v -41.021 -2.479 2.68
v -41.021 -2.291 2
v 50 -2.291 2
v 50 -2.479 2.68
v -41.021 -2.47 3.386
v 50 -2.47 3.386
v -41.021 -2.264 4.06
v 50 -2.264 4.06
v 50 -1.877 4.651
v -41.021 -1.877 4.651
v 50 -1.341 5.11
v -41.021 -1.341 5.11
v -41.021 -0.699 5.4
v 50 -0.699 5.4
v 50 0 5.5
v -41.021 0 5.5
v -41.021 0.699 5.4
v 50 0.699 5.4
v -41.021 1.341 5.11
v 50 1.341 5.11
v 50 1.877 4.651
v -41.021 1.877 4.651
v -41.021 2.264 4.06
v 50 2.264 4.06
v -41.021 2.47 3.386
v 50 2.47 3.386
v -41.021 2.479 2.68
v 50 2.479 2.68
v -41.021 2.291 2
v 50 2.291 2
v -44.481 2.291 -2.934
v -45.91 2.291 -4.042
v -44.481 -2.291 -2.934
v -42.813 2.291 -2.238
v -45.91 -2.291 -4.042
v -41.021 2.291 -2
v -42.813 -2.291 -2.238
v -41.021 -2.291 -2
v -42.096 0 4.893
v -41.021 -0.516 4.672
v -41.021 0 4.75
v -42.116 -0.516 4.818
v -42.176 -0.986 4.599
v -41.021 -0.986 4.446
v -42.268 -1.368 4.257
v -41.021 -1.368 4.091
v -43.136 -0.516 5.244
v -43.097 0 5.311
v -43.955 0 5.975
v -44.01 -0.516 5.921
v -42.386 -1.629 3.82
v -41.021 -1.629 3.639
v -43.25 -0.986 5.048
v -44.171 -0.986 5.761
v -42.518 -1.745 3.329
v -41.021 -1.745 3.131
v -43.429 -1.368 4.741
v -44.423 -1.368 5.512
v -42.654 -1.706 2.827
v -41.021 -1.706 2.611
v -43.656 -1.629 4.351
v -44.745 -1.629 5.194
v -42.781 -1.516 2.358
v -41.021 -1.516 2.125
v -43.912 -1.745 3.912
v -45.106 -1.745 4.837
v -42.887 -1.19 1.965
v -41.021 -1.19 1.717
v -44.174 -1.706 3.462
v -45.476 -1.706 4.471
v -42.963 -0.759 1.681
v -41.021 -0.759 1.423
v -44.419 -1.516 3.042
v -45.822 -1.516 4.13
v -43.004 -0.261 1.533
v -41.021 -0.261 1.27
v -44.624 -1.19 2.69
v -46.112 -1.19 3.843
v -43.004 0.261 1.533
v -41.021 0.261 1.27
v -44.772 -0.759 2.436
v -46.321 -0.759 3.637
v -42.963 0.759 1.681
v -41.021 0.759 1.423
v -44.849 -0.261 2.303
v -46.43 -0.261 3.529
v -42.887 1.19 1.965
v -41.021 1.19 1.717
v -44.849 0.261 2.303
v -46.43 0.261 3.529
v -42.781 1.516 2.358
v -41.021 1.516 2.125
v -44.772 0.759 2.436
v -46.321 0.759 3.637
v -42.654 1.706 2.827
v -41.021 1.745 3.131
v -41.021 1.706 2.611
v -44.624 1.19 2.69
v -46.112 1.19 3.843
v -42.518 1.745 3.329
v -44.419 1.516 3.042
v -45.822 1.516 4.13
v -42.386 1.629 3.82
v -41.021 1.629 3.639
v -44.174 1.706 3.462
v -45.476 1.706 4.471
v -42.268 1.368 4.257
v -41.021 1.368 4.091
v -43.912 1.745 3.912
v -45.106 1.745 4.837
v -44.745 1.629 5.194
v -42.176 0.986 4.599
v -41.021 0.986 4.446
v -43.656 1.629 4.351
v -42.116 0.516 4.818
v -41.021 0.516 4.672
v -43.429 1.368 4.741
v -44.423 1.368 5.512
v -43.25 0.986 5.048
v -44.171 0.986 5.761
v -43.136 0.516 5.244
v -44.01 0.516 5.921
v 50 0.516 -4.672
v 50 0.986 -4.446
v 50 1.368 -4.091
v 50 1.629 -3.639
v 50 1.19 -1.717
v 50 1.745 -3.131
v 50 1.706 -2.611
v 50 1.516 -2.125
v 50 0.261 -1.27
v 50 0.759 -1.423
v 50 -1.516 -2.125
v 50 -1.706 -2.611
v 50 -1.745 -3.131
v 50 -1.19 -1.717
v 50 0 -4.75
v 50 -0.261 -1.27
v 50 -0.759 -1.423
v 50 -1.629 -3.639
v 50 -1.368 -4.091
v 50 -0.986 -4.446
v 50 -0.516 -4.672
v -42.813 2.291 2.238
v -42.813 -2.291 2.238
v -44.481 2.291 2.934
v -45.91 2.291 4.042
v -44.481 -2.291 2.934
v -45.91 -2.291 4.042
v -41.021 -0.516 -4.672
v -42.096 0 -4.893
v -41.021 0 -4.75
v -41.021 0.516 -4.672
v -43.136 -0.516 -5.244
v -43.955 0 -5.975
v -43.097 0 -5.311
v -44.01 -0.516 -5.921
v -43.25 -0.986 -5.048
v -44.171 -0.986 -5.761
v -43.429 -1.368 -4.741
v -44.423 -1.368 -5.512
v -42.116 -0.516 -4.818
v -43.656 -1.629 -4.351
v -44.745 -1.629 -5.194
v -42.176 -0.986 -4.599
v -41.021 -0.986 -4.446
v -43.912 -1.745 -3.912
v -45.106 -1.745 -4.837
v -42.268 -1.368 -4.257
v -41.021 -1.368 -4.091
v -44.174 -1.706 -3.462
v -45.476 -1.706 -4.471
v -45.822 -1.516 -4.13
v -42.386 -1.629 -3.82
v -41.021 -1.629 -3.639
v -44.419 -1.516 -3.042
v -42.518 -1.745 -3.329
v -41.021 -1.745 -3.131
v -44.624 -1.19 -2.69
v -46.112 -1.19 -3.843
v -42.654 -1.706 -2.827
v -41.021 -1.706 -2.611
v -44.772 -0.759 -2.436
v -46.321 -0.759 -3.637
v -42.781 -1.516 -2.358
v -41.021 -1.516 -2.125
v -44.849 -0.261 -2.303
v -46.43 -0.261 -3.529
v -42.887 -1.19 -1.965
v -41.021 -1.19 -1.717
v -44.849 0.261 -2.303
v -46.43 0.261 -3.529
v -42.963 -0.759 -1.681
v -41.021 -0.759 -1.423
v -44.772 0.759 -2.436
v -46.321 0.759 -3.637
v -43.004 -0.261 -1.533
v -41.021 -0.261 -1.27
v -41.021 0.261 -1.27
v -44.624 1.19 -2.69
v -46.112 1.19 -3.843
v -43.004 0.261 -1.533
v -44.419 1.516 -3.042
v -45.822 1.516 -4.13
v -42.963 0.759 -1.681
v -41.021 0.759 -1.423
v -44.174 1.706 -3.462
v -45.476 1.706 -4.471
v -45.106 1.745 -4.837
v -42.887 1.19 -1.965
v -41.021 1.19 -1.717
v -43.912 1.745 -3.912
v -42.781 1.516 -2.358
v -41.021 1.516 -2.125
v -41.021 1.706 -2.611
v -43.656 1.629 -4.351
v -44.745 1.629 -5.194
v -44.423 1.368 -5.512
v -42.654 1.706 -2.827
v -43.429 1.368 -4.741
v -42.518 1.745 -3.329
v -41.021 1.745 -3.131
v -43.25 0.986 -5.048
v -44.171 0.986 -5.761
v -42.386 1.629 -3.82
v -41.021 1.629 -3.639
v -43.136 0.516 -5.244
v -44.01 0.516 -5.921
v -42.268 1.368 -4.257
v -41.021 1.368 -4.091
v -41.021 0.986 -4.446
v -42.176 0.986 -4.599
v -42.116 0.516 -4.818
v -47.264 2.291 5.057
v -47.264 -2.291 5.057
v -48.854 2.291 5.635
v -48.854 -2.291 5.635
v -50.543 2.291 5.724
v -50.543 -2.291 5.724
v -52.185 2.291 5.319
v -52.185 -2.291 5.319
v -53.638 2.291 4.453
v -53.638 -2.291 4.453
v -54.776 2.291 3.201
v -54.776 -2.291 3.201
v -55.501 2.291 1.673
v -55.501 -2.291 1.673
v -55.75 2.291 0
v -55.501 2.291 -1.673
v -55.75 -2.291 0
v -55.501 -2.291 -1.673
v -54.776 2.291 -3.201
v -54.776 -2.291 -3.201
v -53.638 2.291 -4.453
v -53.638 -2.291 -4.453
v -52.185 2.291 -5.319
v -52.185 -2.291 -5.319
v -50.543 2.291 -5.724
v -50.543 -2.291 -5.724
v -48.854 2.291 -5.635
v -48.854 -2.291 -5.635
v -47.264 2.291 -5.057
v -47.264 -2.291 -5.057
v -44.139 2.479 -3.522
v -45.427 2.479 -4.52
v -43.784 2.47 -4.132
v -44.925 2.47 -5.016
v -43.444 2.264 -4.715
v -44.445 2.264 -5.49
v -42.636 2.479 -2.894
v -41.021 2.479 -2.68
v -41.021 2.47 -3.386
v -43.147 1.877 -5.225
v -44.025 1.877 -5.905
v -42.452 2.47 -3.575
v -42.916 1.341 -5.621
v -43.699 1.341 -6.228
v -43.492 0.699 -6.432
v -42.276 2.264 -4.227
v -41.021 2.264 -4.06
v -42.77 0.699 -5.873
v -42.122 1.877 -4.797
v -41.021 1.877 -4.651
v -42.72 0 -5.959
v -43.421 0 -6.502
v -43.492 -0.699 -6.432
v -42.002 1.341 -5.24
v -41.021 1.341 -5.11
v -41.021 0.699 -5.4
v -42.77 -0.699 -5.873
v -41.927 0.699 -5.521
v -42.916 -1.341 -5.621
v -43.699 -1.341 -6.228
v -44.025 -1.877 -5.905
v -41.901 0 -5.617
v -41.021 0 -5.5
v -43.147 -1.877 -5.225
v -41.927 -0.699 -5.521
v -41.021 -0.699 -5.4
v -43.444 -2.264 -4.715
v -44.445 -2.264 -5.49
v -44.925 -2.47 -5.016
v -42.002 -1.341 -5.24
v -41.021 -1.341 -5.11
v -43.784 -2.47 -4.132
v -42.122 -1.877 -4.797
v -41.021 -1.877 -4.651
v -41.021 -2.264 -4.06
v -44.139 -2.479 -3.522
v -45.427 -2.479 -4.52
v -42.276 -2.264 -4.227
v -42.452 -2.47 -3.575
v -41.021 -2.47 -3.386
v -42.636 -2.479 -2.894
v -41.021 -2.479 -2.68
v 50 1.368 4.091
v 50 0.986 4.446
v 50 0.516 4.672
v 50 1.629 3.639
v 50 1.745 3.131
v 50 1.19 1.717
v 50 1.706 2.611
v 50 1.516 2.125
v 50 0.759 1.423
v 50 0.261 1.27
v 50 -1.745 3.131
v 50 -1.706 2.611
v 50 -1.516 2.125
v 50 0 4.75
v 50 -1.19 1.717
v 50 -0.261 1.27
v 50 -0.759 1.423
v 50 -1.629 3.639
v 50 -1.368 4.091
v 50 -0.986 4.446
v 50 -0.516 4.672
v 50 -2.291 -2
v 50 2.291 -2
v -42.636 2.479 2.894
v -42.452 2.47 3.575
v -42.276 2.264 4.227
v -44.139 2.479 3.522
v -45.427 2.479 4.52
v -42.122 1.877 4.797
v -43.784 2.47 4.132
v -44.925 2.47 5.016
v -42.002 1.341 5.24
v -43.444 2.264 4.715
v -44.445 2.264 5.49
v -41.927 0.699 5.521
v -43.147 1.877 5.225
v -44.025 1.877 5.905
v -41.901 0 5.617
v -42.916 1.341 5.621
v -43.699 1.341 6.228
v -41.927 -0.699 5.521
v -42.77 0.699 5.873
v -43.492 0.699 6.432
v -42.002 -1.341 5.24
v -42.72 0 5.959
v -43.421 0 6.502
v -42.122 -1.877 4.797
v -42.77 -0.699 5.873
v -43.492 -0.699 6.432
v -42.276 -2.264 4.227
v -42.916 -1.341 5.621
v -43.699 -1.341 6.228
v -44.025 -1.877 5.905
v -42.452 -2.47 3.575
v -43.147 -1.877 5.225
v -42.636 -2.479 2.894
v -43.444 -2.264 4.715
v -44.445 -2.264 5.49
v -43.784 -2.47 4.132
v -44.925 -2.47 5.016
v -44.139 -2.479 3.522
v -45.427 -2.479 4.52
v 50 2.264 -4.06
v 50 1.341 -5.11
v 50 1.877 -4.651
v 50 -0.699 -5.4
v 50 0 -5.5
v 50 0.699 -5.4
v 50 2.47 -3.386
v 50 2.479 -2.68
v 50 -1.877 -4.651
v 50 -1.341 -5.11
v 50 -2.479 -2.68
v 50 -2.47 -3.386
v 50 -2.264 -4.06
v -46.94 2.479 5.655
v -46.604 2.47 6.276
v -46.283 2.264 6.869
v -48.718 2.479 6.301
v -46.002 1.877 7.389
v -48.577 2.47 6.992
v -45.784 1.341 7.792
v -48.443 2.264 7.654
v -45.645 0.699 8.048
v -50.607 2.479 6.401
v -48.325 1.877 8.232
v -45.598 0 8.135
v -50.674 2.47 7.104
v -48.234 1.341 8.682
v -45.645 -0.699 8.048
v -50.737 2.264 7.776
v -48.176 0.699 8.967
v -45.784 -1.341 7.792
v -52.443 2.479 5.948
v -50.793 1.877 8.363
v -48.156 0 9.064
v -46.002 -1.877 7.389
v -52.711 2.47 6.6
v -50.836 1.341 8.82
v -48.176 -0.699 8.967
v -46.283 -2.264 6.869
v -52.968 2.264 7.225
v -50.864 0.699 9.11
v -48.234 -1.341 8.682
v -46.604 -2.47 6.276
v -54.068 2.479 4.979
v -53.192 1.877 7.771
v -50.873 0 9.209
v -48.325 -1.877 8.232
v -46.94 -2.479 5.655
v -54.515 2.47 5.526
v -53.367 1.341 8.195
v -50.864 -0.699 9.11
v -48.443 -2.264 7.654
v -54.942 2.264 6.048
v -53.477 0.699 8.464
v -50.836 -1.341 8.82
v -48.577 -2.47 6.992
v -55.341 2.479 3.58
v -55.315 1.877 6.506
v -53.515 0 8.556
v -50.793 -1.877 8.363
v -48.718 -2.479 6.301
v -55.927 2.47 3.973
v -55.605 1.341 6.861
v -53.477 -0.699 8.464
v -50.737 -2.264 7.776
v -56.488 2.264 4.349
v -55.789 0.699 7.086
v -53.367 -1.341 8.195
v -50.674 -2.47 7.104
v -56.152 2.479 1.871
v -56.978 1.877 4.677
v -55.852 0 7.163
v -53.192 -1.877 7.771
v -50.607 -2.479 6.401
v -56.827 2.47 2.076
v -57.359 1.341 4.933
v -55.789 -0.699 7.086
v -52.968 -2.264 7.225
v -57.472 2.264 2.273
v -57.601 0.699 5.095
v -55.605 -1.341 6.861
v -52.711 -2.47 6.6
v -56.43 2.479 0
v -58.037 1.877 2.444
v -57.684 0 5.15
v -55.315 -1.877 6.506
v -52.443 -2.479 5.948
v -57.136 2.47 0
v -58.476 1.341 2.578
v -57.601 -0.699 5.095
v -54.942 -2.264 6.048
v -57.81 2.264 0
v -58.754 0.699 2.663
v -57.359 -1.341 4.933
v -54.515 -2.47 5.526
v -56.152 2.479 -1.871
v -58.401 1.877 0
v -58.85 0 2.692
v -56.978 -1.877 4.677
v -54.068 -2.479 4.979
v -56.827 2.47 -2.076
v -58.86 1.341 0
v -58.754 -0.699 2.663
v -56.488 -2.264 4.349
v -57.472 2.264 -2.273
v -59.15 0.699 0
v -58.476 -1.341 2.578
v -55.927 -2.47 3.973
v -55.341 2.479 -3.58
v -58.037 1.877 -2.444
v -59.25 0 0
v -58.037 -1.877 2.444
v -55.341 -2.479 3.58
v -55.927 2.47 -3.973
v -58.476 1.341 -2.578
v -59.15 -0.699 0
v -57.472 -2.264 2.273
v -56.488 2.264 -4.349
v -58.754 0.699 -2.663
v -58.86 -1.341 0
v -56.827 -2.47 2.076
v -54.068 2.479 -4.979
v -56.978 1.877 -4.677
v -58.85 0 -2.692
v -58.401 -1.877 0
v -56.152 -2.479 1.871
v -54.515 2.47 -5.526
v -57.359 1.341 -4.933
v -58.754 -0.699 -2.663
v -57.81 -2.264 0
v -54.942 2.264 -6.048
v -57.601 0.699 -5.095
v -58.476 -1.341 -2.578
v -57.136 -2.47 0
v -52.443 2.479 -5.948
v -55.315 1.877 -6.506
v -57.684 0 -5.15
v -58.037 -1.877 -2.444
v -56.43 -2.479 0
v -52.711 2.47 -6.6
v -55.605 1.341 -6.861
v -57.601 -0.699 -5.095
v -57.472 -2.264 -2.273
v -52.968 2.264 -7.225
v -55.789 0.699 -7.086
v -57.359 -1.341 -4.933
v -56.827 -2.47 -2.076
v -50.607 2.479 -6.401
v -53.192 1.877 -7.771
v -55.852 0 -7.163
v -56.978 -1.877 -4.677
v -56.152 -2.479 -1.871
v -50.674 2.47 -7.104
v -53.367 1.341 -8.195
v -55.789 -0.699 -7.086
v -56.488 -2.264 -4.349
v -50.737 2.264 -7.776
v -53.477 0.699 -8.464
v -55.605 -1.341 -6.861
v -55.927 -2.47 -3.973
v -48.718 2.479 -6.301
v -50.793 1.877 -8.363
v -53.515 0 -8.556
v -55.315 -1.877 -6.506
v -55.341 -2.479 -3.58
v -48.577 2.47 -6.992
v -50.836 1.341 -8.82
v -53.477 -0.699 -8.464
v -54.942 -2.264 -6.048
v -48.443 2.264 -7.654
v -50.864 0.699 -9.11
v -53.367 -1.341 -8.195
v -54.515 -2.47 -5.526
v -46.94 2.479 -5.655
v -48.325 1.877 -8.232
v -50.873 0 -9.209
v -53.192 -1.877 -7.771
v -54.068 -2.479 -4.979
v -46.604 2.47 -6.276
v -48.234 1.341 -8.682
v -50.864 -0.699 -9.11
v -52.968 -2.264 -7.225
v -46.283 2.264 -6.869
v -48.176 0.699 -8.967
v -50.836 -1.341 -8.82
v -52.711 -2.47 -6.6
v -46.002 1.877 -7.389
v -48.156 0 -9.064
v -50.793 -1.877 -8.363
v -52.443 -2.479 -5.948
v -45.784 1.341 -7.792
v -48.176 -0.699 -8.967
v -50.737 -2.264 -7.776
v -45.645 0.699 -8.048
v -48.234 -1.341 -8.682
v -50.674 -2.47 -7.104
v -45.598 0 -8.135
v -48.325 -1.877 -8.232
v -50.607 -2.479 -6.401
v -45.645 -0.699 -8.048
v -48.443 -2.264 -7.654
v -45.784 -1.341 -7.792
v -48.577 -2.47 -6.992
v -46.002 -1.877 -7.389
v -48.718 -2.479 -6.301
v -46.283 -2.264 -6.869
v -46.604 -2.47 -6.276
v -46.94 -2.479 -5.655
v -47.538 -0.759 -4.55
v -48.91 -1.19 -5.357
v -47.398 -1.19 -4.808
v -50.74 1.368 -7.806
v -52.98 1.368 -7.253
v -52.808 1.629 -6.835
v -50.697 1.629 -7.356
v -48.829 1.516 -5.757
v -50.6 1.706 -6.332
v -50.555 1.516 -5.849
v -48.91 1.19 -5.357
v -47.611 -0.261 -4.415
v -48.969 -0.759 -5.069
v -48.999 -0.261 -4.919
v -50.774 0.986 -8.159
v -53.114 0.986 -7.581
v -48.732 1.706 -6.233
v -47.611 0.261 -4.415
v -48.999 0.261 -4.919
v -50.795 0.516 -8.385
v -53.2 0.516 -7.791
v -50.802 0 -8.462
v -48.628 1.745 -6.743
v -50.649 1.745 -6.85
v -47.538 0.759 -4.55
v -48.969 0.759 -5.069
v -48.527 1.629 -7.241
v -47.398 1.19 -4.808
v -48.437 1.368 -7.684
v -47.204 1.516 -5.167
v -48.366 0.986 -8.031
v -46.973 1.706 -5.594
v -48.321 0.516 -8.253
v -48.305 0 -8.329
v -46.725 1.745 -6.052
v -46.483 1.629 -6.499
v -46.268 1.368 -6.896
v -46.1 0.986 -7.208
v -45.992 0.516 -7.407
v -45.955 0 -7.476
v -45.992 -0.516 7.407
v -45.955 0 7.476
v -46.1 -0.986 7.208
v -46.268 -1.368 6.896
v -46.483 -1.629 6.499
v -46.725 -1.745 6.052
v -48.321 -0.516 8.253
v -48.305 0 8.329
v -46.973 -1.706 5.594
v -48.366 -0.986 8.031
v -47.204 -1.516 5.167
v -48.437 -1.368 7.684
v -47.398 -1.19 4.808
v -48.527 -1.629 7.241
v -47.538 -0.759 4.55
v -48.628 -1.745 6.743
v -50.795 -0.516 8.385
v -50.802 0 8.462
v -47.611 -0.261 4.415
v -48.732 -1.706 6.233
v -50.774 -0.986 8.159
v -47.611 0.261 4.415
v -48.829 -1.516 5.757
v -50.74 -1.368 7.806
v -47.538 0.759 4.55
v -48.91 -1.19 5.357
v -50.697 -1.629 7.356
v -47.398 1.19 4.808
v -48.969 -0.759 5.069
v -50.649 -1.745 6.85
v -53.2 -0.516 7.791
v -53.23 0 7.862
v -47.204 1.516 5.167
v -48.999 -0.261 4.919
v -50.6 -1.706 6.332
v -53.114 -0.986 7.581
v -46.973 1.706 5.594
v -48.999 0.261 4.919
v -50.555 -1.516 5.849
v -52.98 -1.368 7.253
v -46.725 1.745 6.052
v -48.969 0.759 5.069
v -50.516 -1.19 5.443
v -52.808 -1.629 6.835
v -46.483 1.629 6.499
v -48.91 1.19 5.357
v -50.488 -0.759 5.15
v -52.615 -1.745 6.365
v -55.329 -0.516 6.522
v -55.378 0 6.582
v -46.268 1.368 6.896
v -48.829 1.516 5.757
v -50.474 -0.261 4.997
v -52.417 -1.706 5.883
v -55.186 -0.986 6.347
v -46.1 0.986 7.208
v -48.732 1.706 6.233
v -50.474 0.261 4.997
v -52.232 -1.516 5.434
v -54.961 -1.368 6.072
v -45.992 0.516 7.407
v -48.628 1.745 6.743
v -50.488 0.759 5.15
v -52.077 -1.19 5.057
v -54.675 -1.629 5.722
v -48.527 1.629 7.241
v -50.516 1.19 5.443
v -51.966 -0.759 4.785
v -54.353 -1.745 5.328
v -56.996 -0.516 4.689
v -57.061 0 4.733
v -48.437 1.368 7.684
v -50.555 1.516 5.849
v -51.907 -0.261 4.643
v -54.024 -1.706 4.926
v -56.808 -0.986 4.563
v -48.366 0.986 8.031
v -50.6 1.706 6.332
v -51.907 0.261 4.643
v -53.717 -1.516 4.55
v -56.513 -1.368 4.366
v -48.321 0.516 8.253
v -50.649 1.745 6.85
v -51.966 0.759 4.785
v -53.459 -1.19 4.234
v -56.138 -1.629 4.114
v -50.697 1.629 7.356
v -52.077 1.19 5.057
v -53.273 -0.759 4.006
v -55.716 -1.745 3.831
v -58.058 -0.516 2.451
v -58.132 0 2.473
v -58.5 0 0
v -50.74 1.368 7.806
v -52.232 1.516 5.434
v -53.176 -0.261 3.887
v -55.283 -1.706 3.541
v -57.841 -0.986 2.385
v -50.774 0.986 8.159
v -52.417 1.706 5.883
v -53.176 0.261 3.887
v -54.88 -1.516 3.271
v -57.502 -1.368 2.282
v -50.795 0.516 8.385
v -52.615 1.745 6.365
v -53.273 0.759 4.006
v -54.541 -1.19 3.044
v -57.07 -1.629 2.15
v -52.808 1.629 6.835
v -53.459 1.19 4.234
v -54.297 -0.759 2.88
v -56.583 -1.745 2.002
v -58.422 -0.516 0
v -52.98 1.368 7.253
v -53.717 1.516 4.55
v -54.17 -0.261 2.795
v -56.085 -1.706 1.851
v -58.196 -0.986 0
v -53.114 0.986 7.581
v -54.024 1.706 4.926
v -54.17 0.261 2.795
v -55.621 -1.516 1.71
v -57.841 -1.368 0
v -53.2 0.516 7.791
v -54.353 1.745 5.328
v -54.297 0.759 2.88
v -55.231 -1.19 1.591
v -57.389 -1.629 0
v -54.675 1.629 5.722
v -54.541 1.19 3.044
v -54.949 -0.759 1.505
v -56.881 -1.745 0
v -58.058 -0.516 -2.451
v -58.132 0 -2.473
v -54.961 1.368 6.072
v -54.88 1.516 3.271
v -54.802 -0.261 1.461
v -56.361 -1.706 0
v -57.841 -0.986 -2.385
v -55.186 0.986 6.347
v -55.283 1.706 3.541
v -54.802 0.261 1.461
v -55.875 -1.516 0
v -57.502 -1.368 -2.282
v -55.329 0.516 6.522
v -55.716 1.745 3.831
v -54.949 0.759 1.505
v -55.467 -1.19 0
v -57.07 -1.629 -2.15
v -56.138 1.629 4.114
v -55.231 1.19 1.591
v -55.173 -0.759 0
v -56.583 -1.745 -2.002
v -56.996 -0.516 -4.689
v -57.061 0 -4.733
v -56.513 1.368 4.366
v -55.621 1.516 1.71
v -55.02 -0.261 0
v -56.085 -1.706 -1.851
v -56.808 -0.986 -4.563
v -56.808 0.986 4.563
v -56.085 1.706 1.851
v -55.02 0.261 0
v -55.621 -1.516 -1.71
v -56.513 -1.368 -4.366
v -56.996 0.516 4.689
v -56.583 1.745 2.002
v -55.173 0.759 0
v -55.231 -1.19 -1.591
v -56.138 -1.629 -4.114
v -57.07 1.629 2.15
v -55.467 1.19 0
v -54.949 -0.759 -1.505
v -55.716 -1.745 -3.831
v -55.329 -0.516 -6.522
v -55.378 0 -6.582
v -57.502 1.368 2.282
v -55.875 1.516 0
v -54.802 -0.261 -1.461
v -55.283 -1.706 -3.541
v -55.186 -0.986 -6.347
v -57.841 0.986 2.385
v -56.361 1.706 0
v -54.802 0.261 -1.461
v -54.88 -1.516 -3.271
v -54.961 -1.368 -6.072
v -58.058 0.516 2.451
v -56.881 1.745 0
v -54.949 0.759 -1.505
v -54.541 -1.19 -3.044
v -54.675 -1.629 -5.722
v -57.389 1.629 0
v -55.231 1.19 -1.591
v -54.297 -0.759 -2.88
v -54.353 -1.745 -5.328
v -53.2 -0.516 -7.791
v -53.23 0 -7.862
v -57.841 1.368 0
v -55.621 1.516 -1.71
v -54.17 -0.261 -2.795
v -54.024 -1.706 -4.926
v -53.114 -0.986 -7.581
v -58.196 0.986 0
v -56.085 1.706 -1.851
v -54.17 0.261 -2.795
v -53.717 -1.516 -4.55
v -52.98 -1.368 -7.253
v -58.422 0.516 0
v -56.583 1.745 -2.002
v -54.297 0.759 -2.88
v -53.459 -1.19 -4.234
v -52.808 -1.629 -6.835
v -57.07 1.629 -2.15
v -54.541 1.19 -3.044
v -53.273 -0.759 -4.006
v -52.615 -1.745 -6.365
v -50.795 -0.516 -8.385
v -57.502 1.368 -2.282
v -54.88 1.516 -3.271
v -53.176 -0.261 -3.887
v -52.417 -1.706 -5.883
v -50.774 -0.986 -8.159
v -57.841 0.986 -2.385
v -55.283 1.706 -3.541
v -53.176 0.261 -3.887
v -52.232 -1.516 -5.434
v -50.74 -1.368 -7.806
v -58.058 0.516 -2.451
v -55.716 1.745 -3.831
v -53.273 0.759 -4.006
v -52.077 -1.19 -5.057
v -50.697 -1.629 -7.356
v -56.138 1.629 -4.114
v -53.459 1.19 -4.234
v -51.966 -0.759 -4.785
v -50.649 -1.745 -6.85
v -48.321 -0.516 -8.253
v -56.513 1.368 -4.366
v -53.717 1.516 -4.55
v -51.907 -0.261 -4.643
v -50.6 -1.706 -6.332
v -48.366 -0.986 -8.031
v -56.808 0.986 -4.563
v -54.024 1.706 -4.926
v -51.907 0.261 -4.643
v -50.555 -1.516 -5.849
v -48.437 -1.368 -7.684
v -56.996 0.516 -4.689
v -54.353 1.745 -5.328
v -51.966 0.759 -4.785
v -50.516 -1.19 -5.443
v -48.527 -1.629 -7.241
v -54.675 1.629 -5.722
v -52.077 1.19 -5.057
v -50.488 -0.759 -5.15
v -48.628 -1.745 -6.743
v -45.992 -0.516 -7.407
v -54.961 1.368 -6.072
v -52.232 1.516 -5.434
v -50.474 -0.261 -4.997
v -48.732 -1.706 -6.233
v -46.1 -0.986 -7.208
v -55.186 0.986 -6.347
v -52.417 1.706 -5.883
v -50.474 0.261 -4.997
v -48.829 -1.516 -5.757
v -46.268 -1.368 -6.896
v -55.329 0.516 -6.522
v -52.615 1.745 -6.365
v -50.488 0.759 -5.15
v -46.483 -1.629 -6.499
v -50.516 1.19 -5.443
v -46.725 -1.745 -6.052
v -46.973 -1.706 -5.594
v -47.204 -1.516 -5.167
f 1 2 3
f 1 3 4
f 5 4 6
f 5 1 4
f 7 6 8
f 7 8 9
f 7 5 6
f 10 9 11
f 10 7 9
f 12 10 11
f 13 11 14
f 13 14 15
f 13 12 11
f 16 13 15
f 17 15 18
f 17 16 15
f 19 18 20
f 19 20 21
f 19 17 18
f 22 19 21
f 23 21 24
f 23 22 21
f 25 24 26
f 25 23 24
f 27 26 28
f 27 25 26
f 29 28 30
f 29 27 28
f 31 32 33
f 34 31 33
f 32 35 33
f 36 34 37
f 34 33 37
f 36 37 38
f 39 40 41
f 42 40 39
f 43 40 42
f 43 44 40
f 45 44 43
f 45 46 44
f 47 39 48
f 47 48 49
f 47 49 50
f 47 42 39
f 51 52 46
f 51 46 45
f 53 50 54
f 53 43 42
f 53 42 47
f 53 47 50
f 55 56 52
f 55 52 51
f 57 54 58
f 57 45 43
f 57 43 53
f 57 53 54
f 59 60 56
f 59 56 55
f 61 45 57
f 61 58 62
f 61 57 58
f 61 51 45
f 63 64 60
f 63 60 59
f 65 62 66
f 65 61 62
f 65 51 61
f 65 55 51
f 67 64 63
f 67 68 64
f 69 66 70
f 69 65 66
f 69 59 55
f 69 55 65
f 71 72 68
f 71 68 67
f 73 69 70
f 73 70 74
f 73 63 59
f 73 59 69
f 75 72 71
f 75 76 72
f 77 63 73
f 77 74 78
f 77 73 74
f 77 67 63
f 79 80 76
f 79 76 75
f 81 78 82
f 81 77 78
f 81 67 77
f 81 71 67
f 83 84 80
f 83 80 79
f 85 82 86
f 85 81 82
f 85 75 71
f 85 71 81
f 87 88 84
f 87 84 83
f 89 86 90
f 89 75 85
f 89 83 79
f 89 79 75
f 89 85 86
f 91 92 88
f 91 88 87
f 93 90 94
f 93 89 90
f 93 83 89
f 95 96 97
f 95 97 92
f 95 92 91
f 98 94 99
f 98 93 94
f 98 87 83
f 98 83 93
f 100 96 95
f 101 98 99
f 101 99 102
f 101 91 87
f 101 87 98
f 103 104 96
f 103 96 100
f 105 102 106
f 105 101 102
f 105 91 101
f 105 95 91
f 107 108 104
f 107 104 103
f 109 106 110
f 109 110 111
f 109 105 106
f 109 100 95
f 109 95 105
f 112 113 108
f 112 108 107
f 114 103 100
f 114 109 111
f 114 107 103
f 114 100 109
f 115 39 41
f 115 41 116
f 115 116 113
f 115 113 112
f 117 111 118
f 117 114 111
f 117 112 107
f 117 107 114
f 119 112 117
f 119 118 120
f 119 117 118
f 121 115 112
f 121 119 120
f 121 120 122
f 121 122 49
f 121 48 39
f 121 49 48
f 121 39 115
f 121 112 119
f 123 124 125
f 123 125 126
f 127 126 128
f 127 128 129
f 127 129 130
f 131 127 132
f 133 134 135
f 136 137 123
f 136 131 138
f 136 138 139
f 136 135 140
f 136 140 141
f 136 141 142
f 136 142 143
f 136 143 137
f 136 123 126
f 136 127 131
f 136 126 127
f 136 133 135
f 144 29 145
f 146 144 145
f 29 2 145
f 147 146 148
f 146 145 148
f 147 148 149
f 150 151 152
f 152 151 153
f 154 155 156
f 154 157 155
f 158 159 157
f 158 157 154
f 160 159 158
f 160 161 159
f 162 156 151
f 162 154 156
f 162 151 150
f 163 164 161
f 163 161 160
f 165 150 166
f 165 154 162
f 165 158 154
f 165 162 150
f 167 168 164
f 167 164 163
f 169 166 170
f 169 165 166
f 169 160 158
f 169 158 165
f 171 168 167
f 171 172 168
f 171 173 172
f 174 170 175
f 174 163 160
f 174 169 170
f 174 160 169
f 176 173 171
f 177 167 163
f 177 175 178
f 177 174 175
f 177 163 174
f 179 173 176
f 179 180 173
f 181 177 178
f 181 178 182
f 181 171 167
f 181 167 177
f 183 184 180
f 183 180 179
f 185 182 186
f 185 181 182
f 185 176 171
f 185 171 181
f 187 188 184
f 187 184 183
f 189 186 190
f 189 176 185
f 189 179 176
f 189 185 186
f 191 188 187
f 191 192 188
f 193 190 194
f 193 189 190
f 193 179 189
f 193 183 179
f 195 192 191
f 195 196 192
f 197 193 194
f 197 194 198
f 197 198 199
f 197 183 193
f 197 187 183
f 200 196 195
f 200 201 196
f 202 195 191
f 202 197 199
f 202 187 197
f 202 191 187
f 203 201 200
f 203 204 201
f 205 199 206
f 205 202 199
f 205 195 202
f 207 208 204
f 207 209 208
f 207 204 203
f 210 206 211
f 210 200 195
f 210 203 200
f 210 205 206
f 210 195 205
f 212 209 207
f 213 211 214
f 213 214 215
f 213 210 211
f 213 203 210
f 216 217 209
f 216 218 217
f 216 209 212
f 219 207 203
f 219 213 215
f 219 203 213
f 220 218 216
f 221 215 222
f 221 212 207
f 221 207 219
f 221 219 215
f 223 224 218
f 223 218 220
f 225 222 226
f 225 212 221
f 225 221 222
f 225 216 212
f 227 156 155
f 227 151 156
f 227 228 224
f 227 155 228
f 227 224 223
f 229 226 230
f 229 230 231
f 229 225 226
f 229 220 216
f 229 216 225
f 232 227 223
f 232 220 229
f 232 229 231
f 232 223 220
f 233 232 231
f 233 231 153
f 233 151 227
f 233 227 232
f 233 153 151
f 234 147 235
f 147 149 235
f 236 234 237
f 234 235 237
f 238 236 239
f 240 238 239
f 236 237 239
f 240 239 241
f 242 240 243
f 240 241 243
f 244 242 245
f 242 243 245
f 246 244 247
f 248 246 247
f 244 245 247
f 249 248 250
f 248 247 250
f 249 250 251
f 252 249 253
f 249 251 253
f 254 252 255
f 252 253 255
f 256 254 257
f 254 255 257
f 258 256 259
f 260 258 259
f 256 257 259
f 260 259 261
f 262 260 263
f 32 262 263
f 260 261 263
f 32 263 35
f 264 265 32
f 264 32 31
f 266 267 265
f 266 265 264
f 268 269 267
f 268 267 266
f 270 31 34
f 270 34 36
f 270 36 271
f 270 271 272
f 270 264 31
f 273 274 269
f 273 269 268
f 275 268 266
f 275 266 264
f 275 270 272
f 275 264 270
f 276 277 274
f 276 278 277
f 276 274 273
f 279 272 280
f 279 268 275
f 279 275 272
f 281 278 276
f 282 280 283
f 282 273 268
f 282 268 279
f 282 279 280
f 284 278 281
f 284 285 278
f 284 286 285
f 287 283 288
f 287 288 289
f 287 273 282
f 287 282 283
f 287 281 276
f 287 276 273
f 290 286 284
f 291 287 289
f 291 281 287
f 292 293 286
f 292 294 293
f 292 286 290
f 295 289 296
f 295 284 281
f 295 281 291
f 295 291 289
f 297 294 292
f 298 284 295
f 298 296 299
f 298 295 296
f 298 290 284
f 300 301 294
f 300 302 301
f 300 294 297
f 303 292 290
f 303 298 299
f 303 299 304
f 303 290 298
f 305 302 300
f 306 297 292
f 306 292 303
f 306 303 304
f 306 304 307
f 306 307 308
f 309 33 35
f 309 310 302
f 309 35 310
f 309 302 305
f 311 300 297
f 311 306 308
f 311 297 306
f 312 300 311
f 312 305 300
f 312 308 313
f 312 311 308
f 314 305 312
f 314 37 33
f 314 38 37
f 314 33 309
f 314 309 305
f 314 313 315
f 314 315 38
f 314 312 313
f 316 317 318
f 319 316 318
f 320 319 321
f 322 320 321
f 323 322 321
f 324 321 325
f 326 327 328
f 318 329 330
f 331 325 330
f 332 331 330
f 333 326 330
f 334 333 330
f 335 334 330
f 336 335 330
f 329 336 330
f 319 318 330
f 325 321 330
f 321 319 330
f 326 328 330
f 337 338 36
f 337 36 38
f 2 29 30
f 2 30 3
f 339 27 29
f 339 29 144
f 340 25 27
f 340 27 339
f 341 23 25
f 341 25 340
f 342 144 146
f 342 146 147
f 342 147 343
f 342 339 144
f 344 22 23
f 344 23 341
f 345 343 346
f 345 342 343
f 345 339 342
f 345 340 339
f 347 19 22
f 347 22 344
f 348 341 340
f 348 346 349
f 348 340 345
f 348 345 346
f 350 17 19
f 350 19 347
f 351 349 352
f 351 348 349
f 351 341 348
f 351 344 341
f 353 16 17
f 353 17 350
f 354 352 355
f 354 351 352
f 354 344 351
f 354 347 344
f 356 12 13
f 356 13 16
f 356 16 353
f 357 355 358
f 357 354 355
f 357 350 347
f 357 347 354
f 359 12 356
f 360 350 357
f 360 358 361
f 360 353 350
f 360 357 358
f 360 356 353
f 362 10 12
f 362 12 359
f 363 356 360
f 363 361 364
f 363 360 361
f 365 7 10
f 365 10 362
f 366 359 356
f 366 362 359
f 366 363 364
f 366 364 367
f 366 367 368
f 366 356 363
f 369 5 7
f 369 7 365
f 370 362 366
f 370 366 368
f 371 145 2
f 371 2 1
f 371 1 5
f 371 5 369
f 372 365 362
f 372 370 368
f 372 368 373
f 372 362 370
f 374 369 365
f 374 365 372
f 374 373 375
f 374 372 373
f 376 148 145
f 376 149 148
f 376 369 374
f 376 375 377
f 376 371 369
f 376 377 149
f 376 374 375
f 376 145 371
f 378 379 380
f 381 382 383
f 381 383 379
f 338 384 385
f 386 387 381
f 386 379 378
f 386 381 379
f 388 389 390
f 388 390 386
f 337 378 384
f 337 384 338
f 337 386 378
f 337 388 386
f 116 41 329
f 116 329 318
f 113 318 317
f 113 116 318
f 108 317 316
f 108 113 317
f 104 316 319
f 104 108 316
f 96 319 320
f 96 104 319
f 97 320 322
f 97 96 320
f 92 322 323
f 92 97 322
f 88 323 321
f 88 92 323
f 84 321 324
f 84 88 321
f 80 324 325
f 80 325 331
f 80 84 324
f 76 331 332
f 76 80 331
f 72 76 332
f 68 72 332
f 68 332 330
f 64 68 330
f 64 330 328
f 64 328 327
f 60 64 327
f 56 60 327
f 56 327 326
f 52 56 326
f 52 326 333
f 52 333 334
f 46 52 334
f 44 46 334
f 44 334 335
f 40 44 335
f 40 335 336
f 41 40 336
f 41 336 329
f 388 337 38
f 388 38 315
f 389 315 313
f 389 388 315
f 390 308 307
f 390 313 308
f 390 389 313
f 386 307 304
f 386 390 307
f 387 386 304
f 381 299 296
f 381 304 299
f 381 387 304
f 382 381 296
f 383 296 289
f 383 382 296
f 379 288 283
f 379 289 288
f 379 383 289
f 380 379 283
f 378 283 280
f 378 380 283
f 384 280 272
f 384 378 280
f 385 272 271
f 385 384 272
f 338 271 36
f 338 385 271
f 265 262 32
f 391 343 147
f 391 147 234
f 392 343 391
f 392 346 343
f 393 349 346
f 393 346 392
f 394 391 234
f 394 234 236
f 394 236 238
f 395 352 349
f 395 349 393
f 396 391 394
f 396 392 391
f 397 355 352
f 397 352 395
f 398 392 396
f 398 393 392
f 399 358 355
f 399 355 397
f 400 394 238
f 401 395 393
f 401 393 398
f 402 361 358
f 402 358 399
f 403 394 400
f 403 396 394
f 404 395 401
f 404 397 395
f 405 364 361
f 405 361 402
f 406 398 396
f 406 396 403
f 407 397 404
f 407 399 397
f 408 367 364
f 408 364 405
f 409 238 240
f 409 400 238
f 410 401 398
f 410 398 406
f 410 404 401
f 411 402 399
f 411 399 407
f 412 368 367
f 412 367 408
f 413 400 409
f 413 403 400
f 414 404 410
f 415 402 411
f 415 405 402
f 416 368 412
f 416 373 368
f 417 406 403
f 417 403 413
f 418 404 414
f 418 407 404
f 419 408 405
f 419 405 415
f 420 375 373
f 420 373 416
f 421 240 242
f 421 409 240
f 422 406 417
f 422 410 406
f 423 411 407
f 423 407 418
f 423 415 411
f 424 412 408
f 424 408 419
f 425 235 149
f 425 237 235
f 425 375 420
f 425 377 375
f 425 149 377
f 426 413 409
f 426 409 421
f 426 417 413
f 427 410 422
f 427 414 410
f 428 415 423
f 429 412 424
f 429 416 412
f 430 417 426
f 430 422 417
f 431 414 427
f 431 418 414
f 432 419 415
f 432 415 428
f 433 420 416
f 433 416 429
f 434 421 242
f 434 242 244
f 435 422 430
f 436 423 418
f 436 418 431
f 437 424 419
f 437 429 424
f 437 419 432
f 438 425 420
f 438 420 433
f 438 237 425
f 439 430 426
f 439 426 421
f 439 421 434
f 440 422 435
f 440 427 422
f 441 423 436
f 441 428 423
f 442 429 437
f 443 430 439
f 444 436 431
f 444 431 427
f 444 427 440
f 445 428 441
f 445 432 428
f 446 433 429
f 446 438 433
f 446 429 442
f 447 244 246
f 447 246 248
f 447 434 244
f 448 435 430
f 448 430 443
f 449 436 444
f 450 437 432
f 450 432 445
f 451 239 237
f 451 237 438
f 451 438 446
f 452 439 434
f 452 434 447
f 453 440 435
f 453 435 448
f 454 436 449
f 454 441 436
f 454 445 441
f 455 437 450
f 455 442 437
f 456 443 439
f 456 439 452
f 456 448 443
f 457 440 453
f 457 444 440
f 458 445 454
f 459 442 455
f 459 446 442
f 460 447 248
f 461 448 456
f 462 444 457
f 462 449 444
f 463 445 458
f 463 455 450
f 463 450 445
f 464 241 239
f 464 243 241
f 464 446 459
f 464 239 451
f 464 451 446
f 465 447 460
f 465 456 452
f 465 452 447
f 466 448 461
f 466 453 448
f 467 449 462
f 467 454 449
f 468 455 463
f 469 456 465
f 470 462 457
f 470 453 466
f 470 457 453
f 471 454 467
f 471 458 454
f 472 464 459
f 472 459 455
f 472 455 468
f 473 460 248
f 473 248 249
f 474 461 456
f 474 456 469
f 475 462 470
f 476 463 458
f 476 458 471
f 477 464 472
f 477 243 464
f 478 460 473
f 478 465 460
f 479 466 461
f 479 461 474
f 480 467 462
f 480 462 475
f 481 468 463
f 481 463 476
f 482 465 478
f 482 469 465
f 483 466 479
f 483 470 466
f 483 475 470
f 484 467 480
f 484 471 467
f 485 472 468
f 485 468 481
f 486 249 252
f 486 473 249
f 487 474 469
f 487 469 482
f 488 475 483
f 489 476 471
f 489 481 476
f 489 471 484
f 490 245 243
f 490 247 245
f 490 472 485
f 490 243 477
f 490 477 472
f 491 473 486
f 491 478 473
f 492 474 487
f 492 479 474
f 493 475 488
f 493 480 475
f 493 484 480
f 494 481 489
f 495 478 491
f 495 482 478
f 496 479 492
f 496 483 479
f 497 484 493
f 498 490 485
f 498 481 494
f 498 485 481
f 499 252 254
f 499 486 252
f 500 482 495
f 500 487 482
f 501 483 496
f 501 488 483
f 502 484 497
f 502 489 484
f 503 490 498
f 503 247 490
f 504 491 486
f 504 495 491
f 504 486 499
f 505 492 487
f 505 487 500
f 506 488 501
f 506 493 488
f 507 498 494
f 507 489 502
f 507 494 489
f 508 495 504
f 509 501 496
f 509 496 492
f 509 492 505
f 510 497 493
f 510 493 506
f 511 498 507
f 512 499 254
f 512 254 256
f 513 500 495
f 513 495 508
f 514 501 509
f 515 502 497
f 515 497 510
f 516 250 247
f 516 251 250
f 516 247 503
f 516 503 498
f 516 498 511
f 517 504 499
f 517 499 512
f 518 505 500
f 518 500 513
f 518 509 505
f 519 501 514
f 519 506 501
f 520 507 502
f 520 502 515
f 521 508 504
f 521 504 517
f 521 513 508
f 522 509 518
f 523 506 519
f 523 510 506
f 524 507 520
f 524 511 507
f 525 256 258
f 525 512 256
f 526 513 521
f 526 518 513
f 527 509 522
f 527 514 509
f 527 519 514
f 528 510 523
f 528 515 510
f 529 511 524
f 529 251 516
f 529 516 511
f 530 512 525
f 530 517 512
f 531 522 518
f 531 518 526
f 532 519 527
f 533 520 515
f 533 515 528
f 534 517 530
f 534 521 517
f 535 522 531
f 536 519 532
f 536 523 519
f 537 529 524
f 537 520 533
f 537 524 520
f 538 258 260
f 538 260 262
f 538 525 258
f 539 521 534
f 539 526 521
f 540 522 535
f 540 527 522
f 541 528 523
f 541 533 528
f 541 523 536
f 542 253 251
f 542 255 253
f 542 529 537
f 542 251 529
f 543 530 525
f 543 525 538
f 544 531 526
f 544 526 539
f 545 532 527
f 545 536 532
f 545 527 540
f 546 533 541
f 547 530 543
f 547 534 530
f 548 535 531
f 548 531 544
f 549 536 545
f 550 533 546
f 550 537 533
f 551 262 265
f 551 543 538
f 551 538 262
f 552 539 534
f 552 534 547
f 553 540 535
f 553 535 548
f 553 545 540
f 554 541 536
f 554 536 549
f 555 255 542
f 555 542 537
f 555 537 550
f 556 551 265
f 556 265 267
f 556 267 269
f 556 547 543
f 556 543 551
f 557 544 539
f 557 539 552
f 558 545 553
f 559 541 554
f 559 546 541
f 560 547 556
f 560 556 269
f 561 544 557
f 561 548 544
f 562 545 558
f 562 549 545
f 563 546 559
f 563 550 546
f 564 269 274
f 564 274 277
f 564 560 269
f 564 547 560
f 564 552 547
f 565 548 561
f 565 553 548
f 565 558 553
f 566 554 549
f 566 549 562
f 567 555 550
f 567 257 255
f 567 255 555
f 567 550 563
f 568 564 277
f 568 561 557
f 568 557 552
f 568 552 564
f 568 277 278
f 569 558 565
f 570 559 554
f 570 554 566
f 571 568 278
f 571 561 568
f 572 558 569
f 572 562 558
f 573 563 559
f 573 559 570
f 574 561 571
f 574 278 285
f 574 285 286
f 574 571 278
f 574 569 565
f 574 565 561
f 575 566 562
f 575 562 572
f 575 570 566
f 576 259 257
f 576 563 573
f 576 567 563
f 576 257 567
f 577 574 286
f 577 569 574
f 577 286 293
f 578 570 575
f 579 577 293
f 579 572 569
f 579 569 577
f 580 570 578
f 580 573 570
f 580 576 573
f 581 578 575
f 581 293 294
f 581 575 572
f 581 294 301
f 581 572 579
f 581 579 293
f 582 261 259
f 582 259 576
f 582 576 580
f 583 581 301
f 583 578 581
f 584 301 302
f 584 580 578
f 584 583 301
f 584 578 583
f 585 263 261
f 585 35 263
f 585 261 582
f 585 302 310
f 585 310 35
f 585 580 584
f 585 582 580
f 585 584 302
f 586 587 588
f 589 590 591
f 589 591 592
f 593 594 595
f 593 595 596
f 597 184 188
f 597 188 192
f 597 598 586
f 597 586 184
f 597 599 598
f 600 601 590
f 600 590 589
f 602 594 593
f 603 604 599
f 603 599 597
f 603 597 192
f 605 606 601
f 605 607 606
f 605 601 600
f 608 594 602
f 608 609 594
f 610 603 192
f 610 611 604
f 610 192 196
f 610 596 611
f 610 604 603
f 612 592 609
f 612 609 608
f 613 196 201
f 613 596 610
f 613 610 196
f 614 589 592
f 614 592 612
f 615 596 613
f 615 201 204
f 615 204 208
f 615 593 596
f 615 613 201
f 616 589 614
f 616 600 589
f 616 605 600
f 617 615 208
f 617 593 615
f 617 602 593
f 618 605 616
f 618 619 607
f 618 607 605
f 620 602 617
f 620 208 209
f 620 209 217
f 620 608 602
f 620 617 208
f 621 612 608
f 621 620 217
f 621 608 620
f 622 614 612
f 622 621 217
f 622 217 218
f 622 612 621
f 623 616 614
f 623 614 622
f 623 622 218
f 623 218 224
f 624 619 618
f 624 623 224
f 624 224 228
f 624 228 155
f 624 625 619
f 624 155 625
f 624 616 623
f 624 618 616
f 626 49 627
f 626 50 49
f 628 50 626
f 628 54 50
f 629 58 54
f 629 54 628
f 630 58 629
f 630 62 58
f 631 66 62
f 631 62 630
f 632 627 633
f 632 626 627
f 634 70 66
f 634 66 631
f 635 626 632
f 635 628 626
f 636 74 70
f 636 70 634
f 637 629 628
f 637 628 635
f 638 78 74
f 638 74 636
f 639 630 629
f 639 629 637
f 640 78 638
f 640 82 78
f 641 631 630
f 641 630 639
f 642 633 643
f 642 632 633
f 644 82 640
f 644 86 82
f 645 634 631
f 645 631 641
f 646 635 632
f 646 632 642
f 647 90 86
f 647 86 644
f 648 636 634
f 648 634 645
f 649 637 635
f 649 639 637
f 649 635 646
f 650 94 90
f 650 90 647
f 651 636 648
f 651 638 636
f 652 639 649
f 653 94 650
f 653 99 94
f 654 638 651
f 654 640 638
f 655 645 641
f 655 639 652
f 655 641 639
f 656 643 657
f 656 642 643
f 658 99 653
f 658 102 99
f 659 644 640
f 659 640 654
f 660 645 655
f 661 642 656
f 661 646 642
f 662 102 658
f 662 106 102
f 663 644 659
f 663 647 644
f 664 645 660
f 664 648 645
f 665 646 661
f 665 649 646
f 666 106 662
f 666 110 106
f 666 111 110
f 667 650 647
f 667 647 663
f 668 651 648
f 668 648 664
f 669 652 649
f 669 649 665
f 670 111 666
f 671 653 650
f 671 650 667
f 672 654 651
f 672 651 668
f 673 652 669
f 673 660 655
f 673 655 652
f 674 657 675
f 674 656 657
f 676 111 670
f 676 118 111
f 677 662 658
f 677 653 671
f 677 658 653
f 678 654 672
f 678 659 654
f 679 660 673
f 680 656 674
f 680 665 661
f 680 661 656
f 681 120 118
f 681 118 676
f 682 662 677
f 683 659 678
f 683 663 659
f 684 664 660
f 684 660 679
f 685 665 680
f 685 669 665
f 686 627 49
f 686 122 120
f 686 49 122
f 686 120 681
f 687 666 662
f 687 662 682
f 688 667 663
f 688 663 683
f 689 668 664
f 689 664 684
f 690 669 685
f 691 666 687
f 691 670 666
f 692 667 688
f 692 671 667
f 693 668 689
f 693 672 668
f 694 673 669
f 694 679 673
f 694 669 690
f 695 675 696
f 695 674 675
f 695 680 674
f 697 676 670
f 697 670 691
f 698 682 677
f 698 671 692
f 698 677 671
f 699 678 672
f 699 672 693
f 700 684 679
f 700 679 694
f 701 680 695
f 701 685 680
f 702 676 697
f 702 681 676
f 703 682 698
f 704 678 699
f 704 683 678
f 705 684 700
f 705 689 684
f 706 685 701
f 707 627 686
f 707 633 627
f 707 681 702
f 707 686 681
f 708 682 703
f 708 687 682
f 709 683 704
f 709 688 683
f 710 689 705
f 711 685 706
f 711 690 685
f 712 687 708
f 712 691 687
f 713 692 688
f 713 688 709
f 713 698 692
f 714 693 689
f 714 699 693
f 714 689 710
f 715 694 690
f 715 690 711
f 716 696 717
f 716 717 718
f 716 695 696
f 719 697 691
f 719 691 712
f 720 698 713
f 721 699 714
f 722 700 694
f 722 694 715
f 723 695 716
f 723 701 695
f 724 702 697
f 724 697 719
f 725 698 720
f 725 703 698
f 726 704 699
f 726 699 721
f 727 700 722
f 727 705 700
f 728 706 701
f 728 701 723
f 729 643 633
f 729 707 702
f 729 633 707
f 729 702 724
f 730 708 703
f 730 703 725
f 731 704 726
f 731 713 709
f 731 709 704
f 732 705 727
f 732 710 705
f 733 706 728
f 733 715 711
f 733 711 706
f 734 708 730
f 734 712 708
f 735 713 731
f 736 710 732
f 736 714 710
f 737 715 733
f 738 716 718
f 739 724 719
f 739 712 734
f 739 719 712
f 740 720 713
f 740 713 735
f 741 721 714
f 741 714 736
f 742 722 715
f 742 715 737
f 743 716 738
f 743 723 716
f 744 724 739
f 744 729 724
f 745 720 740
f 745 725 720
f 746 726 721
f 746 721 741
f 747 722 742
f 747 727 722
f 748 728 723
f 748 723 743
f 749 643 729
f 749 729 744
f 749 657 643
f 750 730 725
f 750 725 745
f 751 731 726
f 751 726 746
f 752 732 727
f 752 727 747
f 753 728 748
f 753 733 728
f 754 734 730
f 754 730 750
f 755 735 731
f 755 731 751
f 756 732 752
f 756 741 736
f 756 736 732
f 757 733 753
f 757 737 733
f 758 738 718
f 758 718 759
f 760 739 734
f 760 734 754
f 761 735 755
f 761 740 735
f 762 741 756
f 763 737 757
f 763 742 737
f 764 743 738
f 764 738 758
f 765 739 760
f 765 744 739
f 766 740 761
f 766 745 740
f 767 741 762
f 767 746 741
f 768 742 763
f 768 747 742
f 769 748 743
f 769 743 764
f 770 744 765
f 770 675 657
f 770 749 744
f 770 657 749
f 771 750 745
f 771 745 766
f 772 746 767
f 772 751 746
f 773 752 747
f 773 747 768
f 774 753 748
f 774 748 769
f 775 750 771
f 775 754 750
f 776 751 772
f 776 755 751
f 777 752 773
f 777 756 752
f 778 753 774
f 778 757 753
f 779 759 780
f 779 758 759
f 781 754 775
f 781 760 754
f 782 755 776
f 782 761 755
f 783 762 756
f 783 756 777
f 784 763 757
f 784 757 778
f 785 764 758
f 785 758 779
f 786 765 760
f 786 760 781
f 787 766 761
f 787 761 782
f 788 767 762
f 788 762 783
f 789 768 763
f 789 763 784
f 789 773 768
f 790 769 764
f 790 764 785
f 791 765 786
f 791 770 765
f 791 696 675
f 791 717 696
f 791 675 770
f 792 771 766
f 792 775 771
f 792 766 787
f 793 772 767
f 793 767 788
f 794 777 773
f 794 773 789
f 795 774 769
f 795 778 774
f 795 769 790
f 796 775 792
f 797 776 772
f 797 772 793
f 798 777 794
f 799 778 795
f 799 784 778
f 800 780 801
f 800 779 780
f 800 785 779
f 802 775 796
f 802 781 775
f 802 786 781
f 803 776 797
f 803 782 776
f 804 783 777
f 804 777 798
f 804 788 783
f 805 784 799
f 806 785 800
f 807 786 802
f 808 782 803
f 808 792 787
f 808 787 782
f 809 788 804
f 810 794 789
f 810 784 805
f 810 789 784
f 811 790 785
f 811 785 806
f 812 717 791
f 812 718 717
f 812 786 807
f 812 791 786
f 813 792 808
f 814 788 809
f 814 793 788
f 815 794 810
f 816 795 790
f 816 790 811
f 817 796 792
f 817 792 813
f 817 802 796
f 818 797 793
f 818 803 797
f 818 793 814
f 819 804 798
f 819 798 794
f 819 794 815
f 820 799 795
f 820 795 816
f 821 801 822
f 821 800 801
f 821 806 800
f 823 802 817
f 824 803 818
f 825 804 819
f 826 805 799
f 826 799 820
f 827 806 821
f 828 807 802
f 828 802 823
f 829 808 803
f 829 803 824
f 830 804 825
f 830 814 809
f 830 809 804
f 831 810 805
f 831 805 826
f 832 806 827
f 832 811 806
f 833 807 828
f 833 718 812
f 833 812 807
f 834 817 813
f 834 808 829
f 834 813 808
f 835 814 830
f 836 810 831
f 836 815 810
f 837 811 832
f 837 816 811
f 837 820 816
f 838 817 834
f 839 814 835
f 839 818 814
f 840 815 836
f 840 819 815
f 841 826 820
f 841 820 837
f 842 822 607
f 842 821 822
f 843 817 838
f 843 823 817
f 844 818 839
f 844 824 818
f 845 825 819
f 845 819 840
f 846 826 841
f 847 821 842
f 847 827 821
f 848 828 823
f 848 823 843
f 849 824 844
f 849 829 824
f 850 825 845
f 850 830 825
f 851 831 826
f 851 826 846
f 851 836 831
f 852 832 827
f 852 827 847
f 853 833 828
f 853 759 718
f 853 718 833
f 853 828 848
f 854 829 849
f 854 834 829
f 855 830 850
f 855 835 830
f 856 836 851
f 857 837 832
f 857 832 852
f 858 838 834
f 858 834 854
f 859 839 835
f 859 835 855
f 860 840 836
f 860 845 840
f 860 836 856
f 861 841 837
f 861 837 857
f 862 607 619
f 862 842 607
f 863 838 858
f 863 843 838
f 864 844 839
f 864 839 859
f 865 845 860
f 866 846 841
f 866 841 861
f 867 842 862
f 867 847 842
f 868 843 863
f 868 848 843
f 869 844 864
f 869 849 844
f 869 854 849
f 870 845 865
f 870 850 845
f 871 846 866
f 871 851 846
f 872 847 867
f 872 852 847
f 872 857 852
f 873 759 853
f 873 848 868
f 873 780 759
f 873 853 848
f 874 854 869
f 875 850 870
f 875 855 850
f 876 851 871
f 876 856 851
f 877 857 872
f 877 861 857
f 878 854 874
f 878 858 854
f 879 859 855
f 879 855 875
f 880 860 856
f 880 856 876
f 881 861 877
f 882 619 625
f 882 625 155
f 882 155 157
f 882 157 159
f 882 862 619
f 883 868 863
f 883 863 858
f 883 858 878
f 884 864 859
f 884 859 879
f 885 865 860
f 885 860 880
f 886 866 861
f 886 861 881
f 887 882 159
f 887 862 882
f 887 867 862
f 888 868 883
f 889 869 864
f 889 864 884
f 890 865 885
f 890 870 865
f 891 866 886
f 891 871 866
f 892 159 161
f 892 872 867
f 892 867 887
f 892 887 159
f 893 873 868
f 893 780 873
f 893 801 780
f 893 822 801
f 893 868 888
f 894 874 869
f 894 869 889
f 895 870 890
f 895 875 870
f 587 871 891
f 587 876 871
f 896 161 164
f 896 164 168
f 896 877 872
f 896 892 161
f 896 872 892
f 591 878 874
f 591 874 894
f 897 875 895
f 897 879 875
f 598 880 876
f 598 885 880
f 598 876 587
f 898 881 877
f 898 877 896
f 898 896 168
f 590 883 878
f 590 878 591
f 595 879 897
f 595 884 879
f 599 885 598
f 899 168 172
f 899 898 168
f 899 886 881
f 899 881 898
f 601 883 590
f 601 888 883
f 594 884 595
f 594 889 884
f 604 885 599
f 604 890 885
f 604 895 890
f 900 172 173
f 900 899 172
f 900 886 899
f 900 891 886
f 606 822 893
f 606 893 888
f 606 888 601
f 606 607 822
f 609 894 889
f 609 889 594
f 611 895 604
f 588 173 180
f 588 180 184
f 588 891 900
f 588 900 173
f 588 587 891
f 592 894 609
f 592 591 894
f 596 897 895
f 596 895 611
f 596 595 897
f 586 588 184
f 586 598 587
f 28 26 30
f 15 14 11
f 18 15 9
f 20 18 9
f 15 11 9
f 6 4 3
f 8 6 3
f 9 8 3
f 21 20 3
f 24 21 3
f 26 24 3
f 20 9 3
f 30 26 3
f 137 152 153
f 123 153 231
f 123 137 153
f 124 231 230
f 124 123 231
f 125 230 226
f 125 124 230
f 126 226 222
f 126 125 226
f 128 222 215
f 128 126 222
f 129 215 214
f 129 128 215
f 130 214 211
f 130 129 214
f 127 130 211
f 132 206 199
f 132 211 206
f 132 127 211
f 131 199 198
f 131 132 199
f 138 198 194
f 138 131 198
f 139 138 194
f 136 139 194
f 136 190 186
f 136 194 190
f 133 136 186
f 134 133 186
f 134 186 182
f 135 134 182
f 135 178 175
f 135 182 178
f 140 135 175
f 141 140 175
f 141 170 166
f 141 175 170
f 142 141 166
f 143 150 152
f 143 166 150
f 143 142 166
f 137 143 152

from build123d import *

# Parameters (mm, degrees)
SKETCH5_R = 1.75


with BuildPart() as part:
    # Sweep1: sweep along a path in Sketch1
    with BuildLine(Plane(origin=(0, 0, 0), x_dir=(1, 0, 0), z_dir=(0, 1, 0))) as sweep1_path:
        Line((50, -3), (-41.020857502, -3))
        ThreePointArc((-41.020857502, -3), (-43.284942951, -3.453787767), (-45.199270348, -4.745049505))
        ThreePointArc((-45.199270348, -4.745049505), (-56.75, 0), (-45.199270348, 4.745049505))
        ThreePointArc((-45.199270348, 4.745049505), (-43.284942951, 3.453787767), (-41.020857502, 3))
        Line((-41.020857502, 3), (50, 3))
    # Sketch5 → Sweep1 (sweep)
    with BuildSketch(Plane(origin=(50, 0, -3), x_dir=(0, 0, -1), z_dir=(1, 0, 0))):
        Circle(SKETCH5_R)
    sweep(path=sweep1_path.line)


with BuildPart() as body_2:
    # Sweep3: sweep along a path in Sketch1<3>
    with BuildLine(Plane(origin=(0, 0, 0), x_dir=(1, 0, 0), z_dir=(0, 1, 0))) as sweep3_path:
        Line((50, -3), (-41.020857502, -3))
        ThreePointArc((-41.020857502, -3), (-43.284942951, -3.453787767), (-45.199270348, -4.745049505))
        ThreePointArc((-45.199270348, -4.745049505), (-56.75, 0), (-45.199270348, 4.745049505))
        ThreePointArc((-45.199270348, 4.745049505), (-43.284942951, 3.453787767), (-41.020857502, 3))
        Line((-41.020857502, 3), (50, 3))
    # Sketch9 → Sweep3 (sweep)
    with BuildSketch(Plane(origin=(50, 0, -3), x_dir=(0, 0, -1), z_dir=(1, 0, 0))):
        with BuildLine():
            Line((-1, 2.291287847), (-1, -2.291287847))
            ThreePointArc((-1, -2.291287847), (2.5, 0), (-1, 2.291287847))
        make_face()
    sweep(path=sweep3_path.line)


solid = Compound([part.part, body_2.part])
